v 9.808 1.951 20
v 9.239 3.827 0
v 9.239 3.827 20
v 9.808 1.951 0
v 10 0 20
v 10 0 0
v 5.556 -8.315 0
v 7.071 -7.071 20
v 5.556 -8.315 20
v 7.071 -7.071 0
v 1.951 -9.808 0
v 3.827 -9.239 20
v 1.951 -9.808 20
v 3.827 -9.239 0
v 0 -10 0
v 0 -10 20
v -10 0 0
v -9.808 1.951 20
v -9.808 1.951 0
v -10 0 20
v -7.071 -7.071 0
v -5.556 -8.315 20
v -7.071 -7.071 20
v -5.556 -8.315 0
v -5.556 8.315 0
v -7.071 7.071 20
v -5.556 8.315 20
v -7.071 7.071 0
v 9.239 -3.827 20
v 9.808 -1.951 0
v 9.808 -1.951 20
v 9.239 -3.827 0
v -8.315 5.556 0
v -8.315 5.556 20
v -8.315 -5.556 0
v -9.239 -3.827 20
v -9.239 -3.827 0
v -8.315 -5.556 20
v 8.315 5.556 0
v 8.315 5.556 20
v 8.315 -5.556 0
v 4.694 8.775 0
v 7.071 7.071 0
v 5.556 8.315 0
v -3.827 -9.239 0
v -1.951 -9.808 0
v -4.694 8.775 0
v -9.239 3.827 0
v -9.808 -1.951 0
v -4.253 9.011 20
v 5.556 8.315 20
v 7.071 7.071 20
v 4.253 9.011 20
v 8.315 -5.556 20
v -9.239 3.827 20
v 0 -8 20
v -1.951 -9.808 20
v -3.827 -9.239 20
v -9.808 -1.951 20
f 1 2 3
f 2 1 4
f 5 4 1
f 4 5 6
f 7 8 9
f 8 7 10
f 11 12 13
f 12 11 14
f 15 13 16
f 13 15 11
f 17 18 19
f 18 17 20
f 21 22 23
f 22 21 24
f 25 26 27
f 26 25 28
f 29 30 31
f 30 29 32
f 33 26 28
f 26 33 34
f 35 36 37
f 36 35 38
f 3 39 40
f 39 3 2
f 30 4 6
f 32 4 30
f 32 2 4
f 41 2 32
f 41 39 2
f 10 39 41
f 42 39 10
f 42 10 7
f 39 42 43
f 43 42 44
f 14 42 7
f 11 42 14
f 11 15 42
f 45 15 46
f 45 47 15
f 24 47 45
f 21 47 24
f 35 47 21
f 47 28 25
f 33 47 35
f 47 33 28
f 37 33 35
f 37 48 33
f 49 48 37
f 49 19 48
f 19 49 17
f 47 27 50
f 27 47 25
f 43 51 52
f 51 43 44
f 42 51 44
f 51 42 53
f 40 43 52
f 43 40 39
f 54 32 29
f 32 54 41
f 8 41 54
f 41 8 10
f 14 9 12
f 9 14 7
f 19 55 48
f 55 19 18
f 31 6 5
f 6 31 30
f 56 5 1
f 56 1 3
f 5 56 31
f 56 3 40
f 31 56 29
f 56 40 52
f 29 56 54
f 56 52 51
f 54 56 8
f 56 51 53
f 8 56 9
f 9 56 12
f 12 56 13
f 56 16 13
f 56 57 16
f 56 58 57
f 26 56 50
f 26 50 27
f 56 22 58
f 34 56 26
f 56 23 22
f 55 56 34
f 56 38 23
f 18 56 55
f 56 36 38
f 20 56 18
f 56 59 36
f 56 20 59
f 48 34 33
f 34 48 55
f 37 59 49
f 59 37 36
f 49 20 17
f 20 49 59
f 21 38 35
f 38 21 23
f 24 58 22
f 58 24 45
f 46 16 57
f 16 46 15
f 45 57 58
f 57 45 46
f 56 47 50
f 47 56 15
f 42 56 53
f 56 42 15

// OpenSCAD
//Width of the channel that connects the two parts.
//For a good combing test, this should be slightly more than 2 line widths.
//That way, the slicer will be able to comb within the preferred boundary
//for the most part, but will have to fall back to the minimum boundary for
//this narrow channel.
channel_width = 0;
radius = 10;
height = 20;

difference() {
	cylinder(r=radius, h=height, $fn=32);
	multmatrix([[1, 0, 0, 0],
					[0, 1, 0.1, 0],
					[0, 0, 1, 0],
					[0, 0, 0, 1]]) { //Skew 1/10th from Z in Y-direction.
		translate([0, -radius + channel_width, -1]) {
			scale([0.25, 1, 1]) {
				rotate([0, 0, 45]) {
					cube(40);
				}
			}
		}
	}
}
